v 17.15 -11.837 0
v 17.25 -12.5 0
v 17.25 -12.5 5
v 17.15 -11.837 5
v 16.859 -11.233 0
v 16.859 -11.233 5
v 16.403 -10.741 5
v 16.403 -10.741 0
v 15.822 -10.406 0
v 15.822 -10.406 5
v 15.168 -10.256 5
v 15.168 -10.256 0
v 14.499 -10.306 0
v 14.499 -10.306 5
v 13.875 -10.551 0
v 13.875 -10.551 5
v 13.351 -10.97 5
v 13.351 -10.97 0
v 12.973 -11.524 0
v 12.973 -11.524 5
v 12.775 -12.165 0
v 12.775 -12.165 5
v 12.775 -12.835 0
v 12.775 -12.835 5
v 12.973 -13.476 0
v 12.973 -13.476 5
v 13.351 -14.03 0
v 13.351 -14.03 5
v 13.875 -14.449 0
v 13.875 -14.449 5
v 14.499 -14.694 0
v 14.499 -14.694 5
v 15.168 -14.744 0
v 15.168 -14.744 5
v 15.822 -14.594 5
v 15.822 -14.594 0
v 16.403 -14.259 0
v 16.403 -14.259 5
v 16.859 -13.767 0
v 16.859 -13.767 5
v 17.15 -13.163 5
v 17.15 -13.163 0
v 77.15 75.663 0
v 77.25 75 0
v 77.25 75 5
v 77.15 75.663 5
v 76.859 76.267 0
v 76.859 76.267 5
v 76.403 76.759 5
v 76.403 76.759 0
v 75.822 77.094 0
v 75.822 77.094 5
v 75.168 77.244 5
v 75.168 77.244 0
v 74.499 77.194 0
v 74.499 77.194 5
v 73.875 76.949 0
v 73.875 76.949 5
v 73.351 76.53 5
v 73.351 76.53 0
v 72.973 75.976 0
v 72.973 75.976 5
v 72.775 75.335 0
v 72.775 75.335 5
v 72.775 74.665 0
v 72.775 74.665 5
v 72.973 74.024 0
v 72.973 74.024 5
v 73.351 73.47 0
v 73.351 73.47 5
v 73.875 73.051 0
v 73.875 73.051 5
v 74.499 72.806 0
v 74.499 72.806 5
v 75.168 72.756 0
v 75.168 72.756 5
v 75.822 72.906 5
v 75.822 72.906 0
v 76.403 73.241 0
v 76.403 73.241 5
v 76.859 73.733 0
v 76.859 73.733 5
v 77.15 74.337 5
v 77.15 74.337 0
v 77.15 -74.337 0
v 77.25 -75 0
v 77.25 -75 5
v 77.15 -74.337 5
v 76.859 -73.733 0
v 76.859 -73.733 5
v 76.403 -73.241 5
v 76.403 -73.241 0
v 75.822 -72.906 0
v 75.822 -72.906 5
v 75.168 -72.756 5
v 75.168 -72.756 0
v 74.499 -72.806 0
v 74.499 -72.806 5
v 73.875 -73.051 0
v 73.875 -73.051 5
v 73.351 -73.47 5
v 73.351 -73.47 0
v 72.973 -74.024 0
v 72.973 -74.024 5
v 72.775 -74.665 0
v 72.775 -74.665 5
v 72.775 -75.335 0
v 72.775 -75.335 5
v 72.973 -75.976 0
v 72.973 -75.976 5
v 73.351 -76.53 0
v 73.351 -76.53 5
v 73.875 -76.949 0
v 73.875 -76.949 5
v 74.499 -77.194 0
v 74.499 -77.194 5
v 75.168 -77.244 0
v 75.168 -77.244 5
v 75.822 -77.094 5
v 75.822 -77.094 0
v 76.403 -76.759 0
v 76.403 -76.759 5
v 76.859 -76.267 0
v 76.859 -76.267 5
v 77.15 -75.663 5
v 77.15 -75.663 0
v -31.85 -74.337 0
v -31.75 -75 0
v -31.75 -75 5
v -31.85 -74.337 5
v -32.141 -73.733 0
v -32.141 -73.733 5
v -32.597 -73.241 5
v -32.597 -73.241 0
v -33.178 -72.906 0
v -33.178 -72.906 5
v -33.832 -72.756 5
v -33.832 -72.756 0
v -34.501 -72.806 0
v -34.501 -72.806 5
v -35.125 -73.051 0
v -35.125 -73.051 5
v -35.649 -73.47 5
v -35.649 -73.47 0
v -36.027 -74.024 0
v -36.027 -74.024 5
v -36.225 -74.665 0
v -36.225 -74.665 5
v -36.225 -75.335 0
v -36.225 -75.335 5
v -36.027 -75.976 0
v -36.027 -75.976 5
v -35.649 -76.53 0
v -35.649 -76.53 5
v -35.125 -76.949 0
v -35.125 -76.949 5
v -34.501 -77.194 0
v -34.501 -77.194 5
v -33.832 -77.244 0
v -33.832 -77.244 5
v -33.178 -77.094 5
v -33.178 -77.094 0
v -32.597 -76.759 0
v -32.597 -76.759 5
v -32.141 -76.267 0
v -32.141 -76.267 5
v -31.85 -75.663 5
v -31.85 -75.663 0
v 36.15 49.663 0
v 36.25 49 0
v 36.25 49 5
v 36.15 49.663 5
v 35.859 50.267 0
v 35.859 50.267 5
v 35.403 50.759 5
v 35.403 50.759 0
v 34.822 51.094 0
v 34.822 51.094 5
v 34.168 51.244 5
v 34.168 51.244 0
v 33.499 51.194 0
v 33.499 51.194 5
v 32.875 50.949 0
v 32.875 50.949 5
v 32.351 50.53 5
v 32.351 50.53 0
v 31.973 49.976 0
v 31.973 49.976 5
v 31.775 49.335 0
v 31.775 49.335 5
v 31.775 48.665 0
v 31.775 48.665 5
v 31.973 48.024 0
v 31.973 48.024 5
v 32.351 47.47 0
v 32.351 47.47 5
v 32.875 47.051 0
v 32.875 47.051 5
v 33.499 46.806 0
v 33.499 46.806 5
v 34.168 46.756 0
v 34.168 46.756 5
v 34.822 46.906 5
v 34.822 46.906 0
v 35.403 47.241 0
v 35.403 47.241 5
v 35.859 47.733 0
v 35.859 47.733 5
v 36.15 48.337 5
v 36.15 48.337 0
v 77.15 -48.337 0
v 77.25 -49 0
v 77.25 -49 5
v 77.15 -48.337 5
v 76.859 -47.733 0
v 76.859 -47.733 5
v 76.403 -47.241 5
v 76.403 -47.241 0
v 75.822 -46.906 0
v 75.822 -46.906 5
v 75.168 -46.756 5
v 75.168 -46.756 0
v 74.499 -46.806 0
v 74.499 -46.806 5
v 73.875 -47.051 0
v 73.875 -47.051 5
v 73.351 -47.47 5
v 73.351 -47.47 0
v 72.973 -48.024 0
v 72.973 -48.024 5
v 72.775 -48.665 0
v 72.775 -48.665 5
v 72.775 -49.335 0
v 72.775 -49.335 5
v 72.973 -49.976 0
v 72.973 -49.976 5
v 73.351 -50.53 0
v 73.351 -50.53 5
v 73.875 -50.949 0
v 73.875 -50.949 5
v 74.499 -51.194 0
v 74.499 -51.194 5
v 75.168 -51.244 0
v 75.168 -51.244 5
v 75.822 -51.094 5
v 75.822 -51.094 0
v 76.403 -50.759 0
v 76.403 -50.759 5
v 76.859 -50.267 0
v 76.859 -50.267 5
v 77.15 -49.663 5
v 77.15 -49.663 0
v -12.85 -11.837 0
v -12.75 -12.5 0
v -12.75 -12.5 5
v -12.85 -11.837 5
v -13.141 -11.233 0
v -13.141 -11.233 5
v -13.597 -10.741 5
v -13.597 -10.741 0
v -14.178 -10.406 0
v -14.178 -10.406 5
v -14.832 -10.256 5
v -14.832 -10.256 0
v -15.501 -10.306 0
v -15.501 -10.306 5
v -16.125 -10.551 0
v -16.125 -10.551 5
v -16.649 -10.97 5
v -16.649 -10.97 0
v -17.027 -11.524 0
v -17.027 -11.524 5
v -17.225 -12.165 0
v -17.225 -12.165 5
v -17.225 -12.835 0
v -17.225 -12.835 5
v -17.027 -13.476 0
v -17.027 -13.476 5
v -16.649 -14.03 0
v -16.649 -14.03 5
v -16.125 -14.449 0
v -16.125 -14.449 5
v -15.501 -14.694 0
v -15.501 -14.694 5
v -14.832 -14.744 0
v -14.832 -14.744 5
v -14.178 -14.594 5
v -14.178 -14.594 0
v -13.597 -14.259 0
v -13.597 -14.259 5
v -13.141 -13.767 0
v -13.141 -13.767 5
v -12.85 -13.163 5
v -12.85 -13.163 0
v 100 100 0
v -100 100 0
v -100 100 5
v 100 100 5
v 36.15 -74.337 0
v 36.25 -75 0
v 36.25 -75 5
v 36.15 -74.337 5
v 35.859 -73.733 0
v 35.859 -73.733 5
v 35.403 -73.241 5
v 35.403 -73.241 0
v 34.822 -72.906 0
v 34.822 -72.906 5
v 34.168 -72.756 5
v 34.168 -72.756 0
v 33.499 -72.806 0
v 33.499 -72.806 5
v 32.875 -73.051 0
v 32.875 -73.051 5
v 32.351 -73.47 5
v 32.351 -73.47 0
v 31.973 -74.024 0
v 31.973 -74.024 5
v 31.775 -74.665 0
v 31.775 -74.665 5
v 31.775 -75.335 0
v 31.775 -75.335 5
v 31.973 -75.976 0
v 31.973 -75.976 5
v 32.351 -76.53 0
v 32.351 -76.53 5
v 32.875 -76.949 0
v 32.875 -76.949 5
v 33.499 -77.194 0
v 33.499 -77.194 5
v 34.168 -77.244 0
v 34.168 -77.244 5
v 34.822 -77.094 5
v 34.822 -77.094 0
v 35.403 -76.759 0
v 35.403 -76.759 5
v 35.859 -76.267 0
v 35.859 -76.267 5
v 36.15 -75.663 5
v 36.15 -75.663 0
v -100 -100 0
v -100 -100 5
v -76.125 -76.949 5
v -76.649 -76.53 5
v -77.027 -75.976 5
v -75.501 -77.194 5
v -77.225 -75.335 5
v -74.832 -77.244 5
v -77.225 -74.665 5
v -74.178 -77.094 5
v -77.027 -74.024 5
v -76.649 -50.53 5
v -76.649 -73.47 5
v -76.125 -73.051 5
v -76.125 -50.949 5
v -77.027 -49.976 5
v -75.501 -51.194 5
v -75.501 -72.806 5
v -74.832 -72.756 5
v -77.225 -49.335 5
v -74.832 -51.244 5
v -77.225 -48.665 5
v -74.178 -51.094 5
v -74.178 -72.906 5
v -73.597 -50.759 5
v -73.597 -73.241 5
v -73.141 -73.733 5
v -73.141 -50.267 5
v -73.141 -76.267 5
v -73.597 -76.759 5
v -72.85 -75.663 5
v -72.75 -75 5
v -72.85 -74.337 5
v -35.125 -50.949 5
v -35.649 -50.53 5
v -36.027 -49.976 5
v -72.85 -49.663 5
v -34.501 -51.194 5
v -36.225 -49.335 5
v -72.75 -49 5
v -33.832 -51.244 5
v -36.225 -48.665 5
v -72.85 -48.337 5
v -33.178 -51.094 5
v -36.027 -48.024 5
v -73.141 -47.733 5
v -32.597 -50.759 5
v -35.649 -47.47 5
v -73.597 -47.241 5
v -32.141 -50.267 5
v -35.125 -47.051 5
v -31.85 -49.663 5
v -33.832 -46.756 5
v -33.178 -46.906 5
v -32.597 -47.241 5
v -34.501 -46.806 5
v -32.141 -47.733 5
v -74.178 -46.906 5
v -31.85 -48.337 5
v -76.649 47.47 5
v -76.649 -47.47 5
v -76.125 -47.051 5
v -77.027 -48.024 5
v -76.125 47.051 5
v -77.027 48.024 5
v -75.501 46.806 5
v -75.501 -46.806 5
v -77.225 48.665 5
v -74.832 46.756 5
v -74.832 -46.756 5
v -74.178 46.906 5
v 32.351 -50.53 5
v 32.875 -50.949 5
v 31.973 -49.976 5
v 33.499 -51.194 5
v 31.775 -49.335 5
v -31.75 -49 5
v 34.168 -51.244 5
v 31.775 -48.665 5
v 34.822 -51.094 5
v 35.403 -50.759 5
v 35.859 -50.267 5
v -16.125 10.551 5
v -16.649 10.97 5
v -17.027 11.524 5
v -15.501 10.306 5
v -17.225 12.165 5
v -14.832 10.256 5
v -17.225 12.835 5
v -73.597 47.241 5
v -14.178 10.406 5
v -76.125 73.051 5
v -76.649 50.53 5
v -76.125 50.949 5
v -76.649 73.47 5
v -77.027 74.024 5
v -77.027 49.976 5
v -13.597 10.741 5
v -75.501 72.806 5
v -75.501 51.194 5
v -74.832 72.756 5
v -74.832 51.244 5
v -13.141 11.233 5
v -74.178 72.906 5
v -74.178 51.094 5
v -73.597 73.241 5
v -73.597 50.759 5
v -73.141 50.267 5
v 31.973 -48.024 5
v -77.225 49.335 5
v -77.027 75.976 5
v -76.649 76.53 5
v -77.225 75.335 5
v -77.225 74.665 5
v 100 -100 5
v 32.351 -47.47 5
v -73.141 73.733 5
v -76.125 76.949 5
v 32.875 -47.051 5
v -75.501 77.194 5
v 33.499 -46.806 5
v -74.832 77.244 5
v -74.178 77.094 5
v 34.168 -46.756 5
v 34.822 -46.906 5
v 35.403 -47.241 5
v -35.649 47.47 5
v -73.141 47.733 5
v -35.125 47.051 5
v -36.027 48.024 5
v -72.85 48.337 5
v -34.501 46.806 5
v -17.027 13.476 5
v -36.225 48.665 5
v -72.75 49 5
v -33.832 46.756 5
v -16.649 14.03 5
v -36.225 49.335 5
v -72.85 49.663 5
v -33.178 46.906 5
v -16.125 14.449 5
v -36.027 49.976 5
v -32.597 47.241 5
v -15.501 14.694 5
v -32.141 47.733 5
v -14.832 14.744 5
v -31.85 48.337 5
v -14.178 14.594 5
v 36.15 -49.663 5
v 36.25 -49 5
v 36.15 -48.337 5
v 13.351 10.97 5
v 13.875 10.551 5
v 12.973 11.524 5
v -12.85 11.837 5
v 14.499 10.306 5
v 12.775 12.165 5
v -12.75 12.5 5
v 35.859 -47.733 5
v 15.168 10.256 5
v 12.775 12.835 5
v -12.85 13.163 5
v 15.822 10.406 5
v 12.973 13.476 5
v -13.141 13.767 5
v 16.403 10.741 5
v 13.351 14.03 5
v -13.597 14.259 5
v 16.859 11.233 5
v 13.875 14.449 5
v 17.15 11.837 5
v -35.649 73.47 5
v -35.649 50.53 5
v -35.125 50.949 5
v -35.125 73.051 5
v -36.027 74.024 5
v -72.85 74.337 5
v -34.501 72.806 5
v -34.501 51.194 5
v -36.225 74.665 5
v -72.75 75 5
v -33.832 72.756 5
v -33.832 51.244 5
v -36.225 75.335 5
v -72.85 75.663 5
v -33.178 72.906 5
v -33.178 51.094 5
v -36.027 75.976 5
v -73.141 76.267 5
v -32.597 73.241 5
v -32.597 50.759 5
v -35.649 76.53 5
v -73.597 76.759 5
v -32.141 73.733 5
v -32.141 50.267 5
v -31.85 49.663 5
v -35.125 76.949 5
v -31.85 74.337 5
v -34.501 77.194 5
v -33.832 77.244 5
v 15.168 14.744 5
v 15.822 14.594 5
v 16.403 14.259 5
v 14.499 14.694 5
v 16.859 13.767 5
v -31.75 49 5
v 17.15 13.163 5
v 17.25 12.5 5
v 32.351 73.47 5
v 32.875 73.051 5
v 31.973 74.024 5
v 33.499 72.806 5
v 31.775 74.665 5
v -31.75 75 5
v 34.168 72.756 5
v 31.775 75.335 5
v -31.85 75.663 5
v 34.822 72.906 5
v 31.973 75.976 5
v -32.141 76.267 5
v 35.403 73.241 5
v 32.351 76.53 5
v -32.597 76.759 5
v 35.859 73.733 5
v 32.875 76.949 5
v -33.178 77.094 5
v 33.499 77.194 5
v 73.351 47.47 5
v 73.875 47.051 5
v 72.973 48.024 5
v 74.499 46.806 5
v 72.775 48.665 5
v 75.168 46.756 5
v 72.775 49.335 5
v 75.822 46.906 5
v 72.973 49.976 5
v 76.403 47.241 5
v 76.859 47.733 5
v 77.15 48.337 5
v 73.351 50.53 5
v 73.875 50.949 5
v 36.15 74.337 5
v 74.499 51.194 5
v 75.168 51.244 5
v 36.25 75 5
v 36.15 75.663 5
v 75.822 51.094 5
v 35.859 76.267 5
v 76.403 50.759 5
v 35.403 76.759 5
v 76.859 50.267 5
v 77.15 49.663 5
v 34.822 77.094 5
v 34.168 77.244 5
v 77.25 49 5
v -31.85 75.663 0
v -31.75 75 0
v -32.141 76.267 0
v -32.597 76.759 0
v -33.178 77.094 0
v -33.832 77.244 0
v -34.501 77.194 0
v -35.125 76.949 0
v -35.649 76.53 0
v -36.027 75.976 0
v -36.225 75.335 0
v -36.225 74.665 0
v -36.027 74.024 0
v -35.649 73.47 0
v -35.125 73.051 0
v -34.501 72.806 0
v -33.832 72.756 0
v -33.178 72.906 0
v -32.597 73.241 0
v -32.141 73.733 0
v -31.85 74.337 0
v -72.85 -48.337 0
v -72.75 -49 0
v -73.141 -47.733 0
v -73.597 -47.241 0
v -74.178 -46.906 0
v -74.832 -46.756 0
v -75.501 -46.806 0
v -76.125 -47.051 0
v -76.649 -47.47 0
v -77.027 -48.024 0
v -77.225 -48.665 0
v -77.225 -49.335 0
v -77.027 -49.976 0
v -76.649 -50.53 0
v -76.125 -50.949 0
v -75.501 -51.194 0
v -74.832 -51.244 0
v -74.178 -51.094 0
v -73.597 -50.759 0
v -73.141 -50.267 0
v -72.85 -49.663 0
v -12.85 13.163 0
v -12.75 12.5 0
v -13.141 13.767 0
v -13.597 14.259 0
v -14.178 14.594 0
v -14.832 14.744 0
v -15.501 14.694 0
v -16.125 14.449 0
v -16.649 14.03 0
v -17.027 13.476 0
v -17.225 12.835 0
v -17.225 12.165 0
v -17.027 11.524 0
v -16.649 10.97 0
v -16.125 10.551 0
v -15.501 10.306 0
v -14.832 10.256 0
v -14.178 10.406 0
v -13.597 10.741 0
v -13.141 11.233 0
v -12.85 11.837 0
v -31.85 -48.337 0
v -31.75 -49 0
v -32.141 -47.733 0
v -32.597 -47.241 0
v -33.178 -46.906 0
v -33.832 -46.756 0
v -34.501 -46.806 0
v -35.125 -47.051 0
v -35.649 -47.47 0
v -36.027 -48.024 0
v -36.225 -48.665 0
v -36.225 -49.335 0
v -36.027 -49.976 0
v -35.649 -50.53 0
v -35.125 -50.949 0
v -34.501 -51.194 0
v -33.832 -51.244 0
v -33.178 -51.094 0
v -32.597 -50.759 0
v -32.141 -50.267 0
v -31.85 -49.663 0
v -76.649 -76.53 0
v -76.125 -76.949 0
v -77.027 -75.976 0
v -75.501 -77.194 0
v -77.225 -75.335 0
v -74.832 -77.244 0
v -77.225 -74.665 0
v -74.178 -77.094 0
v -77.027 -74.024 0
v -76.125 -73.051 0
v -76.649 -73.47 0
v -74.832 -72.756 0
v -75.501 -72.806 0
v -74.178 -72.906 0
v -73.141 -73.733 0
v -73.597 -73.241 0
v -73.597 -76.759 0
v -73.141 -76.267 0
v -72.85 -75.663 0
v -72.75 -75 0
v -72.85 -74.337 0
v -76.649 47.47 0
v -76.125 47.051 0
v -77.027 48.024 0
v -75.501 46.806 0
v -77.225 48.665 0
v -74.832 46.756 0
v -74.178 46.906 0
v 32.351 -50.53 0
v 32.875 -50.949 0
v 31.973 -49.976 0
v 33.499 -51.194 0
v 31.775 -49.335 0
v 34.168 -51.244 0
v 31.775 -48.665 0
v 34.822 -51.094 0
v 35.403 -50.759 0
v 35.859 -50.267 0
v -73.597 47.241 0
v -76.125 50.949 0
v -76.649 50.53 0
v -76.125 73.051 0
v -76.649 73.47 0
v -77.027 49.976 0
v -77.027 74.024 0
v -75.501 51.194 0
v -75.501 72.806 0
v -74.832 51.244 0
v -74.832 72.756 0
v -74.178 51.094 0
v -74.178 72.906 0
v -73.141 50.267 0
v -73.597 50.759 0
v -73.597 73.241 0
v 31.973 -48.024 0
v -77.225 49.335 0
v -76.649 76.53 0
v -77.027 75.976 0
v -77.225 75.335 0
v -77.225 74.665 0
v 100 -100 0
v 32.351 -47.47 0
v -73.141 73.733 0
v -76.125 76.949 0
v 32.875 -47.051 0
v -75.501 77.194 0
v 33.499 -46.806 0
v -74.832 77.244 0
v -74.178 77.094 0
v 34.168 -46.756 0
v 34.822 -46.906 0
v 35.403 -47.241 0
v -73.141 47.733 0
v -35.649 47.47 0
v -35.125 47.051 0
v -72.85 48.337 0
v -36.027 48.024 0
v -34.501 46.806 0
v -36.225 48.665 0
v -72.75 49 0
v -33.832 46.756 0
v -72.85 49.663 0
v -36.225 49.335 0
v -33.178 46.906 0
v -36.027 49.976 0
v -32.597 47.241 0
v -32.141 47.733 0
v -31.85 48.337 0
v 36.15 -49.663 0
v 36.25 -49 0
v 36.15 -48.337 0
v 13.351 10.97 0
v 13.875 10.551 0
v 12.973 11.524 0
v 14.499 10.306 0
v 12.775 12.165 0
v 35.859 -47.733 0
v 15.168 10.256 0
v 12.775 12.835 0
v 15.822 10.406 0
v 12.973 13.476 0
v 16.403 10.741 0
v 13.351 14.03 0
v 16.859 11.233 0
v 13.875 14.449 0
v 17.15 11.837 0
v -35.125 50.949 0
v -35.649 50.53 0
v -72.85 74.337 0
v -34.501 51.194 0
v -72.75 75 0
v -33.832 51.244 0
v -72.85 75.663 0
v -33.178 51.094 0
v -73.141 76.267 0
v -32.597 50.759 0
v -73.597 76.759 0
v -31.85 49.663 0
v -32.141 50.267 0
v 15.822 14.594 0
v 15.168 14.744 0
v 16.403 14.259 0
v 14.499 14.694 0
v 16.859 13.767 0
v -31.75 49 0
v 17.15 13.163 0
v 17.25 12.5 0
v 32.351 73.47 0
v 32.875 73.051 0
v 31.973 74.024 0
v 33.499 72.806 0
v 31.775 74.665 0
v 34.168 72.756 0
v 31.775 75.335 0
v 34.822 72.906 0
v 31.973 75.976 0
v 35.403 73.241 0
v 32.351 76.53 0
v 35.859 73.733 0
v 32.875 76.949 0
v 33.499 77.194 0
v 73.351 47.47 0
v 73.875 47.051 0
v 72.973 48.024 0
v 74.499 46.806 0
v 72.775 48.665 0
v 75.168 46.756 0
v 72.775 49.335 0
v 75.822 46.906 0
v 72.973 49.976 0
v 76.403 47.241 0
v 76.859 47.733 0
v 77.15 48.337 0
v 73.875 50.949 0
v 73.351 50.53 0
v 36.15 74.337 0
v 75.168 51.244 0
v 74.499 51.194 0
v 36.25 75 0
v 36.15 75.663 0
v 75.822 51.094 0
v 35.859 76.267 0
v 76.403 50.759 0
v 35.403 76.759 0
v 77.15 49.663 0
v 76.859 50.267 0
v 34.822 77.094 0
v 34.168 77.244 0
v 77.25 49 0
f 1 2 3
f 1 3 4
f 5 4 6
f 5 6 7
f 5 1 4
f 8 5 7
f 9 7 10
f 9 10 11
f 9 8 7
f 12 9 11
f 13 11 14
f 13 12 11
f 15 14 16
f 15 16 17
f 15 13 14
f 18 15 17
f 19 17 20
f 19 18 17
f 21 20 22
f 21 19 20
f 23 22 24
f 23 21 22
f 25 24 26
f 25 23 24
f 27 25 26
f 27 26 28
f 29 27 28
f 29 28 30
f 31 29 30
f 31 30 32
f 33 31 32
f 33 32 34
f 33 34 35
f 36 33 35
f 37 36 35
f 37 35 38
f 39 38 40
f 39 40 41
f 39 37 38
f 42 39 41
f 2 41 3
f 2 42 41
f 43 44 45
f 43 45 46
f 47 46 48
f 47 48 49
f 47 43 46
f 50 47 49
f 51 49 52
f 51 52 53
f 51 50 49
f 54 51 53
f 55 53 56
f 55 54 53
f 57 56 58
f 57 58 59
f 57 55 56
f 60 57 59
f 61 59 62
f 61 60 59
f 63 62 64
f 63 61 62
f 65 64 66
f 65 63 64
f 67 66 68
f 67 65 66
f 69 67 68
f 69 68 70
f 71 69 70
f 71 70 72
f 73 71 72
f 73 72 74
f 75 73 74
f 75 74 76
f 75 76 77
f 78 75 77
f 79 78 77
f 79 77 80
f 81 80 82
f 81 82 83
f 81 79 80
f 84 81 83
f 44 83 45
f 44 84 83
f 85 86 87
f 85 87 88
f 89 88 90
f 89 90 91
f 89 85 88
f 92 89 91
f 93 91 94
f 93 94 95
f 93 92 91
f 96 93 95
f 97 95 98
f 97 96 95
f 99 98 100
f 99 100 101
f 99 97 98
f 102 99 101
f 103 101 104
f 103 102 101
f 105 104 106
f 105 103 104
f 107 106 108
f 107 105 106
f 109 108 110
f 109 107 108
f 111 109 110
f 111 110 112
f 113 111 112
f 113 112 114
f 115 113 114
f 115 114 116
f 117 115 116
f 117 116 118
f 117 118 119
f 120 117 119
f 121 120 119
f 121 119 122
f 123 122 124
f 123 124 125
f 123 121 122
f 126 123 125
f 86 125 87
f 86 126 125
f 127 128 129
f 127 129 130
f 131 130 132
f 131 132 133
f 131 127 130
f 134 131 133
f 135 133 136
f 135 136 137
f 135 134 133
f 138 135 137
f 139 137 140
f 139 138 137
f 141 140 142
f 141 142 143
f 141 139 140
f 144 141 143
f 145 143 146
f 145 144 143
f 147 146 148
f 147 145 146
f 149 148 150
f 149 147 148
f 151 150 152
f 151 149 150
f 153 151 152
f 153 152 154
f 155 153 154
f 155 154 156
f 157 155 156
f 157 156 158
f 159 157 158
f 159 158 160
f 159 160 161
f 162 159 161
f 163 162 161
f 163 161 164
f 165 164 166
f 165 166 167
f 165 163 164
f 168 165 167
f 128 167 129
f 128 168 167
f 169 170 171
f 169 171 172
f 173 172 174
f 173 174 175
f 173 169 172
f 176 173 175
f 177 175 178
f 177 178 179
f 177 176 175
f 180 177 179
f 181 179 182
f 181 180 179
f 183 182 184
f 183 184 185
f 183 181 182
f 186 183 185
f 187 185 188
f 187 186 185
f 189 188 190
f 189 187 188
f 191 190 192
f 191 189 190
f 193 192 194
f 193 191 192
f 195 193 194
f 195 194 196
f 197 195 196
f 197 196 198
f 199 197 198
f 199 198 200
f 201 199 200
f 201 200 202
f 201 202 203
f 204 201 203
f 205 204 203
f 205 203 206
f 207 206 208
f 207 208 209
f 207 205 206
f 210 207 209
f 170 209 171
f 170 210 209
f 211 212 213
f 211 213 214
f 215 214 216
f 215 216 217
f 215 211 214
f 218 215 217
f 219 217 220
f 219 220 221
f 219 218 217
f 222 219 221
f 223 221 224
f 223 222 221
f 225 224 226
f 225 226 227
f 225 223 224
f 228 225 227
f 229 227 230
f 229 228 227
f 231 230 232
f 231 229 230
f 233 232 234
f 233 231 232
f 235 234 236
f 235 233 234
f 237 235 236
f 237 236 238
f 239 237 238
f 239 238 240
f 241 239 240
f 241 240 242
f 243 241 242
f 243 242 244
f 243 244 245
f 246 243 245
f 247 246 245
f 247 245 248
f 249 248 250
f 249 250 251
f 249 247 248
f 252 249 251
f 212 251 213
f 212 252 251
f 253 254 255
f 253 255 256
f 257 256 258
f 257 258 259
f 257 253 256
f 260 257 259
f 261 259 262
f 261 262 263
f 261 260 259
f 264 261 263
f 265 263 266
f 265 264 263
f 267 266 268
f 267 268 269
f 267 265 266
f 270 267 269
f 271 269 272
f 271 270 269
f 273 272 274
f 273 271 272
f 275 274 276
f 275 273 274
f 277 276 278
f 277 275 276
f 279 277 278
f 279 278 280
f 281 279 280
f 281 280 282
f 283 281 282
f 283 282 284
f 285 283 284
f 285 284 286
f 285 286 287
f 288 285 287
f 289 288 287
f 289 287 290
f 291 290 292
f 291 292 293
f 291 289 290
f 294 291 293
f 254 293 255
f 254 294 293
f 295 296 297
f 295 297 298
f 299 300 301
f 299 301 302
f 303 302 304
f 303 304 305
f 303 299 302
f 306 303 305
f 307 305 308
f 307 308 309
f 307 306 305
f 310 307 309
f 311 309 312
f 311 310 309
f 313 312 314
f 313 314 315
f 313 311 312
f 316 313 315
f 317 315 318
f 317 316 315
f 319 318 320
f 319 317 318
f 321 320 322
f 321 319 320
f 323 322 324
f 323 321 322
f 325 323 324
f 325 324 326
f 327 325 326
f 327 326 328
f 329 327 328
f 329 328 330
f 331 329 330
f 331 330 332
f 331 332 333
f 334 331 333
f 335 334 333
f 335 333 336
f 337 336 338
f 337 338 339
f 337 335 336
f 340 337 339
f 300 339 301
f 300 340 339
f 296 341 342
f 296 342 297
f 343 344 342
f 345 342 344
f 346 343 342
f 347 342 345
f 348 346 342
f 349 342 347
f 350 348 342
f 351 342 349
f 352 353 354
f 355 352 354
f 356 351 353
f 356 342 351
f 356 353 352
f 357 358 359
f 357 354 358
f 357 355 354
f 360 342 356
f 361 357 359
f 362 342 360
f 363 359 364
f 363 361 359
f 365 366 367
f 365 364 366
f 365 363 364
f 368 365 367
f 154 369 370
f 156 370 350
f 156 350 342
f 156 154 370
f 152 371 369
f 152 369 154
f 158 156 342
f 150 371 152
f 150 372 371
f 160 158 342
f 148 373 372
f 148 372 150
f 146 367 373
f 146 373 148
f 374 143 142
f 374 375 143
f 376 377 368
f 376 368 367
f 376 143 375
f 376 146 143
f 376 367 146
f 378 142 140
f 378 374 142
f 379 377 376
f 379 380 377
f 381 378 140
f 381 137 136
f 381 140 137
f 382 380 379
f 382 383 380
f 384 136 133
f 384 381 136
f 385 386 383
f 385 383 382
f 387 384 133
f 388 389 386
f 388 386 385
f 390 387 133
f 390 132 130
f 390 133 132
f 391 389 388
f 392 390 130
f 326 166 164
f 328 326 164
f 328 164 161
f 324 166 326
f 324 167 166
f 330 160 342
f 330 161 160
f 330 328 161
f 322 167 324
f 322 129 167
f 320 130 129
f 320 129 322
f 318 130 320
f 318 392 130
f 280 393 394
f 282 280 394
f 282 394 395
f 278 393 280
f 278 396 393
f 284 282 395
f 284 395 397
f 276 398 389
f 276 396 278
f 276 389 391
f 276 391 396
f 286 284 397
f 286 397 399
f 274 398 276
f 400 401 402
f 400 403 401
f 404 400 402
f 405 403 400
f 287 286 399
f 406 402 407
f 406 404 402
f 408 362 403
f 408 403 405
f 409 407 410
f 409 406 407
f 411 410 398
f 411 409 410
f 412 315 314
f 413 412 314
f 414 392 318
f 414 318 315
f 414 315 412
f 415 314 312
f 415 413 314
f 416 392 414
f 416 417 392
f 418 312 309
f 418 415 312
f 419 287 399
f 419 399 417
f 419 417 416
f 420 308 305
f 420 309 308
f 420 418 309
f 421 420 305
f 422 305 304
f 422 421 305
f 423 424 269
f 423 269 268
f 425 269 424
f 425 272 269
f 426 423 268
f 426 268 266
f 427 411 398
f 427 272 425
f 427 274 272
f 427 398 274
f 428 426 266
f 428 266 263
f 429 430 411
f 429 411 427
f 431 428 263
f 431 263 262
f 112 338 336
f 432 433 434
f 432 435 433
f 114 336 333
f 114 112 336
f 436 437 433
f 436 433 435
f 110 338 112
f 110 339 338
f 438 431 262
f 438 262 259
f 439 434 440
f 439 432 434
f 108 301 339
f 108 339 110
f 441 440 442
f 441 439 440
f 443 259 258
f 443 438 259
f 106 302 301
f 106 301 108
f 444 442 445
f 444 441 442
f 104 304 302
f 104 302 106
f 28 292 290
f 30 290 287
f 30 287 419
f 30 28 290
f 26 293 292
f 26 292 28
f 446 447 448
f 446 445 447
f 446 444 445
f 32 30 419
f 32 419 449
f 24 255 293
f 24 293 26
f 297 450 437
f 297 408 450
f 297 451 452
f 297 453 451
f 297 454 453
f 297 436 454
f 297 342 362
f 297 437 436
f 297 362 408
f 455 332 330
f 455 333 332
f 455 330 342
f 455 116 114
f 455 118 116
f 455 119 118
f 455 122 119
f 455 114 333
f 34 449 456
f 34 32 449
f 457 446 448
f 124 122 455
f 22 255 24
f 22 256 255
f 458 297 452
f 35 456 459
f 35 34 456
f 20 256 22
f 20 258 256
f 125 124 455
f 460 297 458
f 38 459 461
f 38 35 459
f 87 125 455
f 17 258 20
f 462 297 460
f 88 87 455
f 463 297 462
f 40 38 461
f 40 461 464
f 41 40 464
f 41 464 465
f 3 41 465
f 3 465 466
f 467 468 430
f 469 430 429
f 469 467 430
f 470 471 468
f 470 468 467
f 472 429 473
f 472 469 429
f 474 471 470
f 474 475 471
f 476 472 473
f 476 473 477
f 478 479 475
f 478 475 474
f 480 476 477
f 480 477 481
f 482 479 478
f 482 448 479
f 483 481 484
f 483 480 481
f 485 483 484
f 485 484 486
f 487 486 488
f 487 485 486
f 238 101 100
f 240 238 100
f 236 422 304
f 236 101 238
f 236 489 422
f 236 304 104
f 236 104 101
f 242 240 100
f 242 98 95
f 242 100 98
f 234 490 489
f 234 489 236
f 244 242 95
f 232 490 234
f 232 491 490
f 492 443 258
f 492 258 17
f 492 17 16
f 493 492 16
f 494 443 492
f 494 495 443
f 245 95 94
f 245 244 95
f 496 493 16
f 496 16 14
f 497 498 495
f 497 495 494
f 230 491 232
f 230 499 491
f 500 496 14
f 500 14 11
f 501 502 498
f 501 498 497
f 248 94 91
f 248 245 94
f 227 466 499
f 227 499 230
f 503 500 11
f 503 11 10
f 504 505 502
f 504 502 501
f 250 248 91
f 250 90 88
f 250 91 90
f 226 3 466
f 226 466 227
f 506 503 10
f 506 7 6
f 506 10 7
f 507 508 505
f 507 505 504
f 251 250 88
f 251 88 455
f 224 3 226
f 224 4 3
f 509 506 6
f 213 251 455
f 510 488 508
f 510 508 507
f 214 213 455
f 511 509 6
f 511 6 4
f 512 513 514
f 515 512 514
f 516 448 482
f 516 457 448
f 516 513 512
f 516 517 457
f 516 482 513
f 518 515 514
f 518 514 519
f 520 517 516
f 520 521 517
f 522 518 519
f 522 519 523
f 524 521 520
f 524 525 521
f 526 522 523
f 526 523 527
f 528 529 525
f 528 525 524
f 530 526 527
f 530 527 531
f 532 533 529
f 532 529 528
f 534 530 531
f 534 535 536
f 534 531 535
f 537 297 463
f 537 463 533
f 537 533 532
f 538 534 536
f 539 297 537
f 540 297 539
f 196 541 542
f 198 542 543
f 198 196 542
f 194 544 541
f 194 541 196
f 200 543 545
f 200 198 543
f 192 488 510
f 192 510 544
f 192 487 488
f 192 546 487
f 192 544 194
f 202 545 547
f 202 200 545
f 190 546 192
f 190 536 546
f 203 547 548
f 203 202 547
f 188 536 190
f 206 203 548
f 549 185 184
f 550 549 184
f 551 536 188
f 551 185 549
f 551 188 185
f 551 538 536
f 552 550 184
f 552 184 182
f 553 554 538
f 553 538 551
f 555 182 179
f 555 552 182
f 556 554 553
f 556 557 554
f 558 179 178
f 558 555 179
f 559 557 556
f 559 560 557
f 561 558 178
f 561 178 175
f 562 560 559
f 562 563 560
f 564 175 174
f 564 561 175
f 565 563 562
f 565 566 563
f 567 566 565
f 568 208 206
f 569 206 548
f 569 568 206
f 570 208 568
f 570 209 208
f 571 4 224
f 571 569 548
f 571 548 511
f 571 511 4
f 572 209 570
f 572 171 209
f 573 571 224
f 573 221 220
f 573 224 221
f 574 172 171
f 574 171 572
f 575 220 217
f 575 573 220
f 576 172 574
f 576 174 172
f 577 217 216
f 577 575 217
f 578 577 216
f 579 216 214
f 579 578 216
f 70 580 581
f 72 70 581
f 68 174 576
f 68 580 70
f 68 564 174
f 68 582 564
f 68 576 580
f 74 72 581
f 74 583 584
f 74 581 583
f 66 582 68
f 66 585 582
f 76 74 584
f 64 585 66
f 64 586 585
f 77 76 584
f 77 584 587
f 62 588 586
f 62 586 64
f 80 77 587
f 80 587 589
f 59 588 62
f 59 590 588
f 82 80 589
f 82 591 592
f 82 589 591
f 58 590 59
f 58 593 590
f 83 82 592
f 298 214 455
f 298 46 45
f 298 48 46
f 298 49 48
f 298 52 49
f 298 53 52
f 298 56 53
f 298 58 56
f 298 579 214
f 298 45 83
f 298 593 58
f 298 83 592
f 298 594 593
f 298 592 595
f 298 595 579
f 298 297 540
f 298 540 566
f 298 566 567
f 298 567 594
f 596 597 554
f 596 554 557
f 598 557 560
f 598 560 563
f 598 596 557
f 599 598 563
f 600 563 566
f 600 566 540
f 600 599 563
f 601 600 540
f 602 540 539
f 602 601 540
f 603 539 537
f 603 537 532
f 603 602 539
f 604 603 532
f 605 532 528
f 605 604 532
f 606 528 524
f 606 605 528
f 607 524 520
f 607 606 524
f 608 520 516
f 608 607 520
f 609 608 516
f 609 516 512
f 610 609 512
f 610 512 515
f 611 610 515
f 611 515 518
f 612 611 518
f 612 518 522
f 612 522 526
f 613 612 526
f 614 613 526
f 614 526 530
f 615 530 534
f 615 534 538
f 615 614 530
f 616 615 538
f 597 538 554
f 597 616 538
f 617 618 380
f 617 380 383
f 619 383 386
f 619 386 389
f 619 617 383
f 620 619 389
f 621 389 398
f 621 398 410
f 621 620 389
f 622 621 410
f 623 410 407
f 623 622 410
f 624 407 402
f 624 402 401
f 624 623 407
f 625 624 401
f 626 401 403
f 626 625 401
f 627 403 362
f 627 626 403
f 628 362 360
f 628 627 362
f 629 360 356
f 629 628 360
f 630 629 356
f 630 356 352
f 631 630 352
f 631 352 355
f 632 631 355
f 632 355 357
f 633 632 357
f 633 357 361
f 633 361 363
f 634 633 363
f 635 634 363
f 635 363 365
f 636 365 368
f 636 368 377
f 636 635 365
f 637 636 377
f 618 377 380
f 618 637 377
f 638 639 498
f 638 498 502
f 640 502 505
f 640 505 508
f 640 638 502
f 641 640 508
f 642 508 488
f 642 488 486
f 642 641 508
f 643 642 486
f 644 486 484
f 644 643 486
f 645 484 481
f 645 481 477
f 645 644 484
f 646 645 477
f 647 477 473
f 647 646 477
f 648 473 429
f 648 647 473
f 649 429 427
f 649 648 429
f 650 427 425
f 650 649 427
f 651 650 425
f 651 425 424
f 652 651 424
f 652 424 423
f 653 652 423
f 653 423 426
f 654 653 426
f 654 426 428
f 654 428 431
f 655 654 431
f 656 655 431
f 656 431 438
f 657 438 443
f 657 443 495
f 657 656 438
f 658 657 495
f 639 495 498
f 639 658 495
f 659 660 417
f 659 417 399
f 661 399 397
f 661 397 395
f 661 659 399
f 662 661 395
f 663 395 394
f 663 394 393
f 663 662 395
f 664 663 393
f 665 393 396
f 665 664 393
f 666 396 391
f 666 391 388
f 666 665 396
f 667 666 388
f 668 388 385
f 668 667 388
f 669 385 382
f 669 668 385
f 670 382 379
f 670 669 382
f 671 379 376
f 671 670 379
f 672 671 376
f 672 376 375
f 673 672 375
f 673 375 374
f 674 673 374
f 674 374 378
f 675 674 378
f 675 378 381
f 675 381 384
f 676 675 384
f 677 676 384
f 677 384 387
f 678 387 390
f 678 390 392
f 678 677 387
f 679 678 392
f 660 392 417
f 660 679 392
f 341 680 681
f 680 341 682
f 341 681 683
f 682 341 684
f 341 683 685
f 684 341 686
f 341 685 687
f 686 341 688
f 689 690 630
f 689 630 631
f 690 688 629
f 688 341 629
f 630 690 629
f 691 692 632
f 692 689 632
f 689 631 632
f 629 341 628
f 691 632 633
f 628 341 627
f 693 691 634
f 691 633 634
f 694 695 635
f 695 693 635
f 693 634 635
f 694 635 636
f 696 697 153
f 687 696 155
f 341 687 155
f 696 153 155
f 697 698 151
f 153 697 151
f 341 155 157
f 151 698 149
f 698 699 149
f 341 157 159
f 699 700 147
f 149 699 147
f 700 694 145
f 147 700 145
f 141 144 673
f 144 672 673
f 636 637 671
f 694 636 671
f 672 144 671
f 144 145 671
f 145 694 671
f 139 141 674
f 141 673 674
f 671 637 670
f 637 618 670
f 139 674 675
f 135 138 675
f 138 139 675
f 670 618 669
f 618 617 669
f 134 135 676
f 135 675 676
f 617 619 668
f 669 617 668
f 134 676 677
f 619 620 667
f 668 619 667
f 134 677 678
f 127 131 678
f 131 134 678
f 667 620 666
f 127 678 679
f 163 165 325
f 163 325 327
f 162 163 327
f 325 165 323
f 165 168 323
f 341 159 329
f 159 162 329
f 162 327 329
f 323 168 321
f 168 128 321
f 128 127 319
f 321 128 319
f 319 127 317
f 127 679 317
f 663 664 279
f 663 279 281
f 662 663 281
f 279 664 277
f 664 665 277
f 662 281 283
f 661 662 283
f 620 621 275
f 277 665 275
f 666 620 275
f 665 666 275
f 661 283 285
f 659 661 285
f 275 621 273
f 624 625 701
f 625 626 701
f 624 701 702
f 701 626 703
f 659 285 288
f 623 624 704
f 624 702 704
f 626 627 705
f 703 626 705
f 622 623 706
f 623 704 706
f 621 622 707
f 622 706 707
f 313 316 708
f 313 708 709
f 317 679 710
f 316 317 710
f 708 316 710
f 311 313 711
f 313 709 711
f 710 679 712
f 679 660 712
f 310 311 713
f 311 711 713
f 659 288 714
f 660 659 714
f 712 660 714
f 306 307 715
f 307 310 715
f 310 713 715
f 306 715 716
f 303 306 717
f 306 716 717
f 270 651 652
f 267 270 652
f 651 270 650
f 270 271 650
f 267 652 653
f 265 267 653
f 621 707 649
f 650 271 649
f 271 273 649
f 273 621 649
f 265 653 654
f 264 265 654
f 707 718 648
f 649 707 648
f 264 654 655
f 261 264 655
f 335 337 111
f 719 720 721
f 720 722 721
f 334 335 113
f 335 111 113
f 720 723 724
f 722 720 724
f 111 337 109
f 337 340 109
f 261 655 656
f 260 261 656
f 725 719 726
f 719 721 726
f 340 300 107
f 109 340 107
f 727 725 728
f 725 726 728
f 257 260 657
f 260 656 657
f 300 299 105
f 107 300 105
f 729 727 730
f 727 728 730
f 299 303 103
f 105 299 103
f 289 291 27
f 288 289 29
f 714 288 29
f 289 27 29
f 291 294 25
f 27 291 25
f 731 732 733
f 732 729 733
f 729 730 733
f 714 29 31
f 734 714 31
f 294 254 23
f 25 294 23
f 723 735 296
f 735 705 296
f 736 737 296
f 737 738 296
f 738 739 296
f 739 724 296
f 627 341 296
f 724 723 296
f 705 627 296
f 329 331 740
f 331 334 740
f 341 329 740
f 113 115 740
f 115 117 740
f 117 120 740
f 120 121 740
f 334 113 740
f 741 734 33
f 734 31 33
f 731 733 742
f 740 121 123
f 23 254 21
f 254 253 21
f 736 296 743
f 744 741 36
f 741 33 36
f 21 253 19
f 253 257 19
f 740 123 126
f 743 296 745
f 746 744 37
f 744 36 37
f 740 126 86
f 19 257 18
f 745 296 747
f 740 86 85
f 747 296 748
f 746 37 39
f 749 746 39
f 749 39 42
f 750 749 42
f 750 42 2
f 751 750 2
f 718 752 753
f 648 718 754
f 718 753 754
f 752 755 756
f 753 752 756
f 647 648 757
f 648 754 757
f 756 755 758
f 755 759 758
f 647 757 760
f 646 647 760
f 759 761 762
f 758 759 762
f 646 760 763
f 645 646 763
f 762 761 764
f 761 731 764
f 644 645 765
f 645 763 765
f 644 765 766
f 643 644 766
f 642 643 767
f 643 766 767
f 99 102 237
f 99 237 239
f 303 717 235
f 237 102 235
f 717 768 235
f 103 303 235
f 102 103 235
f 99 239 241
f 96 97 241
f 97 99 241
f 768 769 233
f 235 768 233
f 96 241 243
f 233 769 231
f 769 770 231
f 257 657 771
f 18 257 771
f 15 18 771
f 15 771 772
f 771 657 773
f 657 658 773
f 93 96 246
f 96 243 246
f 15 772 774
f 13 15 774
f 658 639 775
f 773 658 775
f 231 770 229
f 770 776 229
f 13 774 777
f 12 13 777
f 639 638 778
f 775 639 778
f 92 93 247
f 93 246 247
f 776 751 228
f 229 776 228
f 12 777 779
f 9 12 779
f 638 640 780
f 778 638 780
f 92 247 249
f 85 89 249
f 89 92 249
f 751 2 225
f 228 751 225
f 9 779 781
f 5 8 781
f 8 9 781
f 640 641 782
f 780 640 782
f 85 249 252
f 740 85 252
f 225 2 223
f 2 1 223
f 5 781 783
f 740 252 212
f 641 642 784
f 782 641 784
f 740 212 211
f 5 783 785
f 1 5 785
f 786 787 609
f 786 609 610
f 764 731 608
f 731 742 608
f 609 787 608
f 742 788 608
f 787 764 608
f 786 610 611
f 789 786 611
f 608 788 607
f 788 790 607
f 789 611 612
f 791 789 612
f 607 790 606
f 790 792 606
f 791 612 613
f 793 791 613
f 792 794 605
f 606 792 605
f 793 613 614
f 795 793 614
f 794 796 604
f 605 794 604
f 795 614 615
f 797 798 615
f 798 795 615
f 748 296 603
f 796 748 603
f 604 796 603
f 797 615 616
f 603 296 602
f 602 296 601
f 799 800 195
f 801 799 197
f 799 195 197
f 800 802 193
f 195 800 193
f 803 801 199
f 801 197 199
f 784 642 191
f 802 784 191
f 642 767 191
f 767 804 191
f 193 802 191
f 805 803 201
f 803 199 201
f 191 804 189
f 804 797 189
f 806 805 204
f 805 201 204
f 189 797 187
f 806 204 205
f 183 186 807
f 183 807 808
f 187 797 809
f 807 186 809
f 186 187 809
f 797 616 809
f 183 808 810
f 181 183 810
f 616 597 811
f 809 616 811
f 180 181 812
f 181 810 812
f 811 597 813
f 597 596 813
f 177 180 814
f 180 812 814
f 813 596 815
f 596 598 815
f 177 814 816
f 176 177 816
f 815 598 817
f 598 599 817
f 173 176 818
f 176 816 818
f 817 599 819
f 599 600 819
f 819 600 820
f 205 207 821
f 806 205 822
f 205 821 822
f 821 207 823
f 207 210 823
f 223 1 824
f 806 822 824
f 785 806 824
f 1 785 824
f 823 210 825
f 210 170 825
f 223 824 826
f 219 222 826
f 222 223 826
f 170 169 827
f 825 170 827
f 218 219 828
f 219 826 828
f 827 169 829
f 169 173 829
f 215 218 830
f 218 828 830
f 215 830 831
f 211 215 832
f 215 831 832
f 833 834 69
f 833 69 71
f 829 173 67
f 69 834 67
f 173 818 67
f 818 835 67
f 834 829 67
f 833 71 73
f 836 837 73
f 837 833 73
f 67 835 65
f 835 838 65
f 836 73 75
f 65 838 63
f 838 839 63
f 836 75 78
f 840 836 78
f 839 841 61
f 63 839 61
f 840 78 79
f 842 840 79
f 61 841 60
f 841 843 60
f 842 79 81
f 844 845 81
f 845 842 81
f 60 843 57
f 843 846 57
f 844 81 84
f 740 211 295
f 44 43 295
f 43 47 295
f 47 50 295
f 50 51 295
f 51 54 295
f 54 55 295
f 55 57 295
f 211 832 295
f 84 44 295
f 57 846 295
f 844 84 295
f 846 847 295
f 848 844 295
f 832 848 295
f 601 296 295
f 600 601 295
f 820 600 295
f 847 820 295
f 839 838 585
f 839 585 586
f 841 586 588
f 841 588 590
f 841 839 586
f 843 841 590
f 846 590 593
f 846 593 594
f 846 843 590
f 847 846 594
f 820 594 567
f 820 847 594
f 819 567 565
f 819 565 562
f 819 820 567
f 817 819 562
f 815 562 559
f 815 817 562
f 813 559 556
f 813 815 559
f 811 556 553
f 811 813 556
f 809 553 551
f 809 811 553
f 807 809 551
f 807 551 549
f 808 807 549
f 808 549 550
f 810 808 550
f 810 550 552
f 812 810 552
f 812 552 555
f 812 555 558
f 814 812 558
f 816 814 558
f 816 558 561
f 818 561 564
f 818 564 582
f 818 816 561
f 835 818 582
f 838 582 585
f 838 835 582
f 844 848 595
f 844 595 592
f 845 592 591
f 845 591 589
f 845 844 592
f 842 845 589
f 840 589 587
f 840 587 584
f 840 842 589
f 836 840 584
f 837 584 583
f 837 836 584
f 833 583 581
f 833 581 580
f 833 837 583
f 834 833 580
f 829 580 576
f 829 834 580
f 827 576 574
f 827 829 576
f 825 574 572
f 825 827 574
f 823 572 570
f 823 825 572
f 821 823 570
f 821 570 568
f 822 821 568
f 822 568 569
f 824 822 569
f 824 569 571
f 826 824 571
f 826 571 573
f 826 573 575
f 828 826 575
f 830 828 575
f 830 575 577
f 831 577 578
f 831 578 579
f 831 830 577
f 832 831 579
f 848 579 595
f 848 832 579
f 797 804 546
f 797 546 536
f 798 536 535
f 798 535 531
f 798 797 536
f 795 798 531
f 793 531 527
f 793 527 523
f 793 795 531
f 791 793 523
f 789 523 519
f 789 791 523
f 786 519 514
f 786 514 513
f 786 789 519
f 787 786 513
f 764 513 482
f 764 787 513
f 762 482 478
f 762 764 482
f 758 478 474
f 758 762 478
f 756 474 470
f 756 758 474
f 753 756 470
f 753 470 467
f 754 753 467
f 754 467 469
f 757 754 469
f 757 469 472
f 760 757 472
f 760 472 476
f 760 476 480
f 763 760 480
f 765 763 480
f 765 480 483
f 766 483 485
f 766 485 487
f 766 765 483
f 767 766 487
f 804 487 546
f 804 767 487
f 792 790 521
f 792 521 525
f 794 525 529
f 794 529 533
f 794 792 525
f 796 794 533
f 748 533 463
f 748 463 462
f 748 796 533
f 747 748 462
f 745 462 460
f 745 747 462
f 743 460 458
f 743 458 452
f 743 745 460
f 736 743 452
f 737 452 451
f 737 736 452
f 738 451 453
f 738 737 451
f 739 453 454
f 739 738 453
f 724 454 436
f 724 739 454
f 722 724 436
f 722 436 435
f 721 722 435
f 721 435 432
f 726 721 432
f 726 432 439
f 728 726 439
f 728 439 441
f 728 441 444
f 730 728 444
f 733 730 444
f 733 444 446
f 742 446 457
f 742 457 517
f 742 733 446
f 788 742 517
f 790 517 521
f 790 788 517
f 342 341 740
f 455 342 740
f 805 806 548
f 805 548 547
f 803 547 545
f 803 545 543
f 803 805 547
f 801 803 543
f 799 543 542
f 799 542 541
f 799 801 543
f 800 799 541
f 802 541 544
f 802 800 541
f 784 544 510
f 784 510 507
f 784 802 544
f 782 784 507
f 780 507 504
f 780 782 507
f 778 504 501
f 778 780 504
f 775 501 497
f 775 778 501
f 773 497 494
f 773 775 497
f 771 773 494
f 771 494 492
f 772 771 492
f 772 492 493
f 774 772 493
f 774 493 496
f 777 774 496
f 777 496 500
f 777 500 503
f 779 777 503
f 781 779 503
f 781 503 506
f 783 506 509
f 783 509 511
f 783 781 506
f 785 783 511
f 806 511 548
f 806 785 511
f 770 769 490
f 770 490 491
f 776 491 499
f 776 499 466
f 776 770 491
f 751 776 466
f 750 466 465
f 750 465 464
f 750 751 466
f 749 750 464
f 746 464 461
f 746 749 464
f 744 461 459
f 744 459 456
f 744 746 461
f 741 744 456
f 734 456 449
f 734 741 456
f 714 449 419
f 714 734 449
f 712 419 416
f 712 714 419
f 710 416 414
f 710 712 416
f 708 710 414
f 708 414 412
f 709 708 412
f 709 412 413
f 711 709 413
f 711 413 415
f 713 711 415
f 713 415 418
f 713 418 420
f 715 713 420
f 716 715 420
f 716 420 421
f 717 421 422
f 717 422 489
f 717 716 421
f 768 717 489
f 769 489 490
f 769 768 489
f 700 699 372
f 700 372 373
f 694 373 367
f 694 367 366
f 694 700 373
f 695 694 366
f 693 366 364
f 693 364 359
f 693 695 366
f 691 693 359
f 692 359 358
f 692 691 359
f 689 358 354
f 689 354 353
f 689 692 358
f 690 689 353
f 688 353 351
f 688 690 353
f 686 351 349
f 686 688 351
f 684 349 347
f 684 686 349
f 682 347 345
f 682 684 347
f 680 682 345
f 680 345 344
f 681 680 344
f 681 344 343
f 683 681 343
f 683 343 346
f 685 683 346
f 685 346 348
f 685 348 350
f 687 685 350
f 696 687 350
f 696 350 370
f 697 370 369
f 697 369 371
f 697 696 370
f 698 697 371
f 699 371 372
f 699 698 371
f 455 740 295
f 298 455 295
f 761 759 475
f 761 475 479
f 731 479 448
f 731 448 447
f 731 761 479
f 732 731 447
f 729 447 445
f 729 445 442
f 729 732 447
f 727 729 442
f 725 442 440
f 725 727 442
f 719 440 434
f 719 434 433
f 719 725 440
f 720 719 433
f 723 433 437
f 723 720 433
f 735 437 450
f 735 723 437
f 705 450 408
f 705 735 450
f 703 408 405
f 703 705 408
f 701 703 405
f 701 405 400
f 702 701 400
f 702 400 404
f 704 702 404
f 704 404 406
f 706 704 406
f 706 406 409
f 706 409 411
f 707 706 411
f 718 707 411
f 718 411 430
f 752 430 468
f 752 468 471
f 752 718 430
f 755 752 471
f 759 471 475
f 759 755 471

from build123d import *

# Parameters (mm, degrees)
F0_W     = 200
F0_H     = 200
F0_R     = 2.25
F1_DEPTH = 5


with BuildPart() as f1:
    # F0 (on Top) → F1 (new body)
    with BuildSketch(Plane.XY):
        Rectangle(F0_W, F0_H)
        with Locations((-75, -75)):
            Circle(F0_R, mode=Mode.SUBTRACT)
        with Locations((-34, -75)):
            Circle(F0_R, mode=Mode.SUBTRACT)
        with Locations((-75, -49)):
            Circle(F0_R, mode=Mode.SUBTRACT)
        with Locations((-34, -49)):
            Circle(F0_R, mode=Mode.SUBTRACT)
        with Locations((-15, -12.5)):
            Circle(F0_R, mode=Mode.SUBTRACT)
        with Locations((34, -75)):
            Circle(F0_R, mode=Mode.SUBTRACT)
        with Locations((75, -75)):
            Circle(F0_R, mode=Mode.SUBTRACT)
        with Locations((34, -49)):
            Circle(F0_R, mode=Mode.SUBTRACT)
        with Locations((15, -12.5)):
            Circle(F0_R, mode=Mode.SUBTRACT)
        with Locations((75, -49)):
            Circle(F0_R, mode=Mode.SUBTRACT)
        with Locations((-75, 49)):
            Circle(F0_R, mode=Mode.SUBTRACT)
        with Locations((-15, 12.5)):
            Circle(F0_R, mode=Mode.SUBTRACT)
        with Locations((-34, 49)):
            Circle(F0_R, mode=Mode.SUBTRACT)
        with Locations((-75, 75)):
            Circle(F0_R, mode=Mode.SUBTRACT)
        with Locations((-34, 75)):
            Circle(F0_R, mode=Mode.SUBTRACT)
        with Locations((15, 12.5)):
            Circle(F0_R, mode=Mode.SUBTRACT)
        with Locations((34, 49)):
            Circle(F0_R, mode=Mode.SUBTRACT)
        with Locations((75, 49)):
            Circle(F0_R, mode=Mode.SUBTRACT)
        with Locations((34, 75)):
            Circle(F0_R, mode=Mode.SUBTRACT)
        with Locations((75, 75)):
            Circle(F0_R, mode=Mode.SUBTRACT)
    extrude(amount=F1_DEPTH)


solid = f1.part
